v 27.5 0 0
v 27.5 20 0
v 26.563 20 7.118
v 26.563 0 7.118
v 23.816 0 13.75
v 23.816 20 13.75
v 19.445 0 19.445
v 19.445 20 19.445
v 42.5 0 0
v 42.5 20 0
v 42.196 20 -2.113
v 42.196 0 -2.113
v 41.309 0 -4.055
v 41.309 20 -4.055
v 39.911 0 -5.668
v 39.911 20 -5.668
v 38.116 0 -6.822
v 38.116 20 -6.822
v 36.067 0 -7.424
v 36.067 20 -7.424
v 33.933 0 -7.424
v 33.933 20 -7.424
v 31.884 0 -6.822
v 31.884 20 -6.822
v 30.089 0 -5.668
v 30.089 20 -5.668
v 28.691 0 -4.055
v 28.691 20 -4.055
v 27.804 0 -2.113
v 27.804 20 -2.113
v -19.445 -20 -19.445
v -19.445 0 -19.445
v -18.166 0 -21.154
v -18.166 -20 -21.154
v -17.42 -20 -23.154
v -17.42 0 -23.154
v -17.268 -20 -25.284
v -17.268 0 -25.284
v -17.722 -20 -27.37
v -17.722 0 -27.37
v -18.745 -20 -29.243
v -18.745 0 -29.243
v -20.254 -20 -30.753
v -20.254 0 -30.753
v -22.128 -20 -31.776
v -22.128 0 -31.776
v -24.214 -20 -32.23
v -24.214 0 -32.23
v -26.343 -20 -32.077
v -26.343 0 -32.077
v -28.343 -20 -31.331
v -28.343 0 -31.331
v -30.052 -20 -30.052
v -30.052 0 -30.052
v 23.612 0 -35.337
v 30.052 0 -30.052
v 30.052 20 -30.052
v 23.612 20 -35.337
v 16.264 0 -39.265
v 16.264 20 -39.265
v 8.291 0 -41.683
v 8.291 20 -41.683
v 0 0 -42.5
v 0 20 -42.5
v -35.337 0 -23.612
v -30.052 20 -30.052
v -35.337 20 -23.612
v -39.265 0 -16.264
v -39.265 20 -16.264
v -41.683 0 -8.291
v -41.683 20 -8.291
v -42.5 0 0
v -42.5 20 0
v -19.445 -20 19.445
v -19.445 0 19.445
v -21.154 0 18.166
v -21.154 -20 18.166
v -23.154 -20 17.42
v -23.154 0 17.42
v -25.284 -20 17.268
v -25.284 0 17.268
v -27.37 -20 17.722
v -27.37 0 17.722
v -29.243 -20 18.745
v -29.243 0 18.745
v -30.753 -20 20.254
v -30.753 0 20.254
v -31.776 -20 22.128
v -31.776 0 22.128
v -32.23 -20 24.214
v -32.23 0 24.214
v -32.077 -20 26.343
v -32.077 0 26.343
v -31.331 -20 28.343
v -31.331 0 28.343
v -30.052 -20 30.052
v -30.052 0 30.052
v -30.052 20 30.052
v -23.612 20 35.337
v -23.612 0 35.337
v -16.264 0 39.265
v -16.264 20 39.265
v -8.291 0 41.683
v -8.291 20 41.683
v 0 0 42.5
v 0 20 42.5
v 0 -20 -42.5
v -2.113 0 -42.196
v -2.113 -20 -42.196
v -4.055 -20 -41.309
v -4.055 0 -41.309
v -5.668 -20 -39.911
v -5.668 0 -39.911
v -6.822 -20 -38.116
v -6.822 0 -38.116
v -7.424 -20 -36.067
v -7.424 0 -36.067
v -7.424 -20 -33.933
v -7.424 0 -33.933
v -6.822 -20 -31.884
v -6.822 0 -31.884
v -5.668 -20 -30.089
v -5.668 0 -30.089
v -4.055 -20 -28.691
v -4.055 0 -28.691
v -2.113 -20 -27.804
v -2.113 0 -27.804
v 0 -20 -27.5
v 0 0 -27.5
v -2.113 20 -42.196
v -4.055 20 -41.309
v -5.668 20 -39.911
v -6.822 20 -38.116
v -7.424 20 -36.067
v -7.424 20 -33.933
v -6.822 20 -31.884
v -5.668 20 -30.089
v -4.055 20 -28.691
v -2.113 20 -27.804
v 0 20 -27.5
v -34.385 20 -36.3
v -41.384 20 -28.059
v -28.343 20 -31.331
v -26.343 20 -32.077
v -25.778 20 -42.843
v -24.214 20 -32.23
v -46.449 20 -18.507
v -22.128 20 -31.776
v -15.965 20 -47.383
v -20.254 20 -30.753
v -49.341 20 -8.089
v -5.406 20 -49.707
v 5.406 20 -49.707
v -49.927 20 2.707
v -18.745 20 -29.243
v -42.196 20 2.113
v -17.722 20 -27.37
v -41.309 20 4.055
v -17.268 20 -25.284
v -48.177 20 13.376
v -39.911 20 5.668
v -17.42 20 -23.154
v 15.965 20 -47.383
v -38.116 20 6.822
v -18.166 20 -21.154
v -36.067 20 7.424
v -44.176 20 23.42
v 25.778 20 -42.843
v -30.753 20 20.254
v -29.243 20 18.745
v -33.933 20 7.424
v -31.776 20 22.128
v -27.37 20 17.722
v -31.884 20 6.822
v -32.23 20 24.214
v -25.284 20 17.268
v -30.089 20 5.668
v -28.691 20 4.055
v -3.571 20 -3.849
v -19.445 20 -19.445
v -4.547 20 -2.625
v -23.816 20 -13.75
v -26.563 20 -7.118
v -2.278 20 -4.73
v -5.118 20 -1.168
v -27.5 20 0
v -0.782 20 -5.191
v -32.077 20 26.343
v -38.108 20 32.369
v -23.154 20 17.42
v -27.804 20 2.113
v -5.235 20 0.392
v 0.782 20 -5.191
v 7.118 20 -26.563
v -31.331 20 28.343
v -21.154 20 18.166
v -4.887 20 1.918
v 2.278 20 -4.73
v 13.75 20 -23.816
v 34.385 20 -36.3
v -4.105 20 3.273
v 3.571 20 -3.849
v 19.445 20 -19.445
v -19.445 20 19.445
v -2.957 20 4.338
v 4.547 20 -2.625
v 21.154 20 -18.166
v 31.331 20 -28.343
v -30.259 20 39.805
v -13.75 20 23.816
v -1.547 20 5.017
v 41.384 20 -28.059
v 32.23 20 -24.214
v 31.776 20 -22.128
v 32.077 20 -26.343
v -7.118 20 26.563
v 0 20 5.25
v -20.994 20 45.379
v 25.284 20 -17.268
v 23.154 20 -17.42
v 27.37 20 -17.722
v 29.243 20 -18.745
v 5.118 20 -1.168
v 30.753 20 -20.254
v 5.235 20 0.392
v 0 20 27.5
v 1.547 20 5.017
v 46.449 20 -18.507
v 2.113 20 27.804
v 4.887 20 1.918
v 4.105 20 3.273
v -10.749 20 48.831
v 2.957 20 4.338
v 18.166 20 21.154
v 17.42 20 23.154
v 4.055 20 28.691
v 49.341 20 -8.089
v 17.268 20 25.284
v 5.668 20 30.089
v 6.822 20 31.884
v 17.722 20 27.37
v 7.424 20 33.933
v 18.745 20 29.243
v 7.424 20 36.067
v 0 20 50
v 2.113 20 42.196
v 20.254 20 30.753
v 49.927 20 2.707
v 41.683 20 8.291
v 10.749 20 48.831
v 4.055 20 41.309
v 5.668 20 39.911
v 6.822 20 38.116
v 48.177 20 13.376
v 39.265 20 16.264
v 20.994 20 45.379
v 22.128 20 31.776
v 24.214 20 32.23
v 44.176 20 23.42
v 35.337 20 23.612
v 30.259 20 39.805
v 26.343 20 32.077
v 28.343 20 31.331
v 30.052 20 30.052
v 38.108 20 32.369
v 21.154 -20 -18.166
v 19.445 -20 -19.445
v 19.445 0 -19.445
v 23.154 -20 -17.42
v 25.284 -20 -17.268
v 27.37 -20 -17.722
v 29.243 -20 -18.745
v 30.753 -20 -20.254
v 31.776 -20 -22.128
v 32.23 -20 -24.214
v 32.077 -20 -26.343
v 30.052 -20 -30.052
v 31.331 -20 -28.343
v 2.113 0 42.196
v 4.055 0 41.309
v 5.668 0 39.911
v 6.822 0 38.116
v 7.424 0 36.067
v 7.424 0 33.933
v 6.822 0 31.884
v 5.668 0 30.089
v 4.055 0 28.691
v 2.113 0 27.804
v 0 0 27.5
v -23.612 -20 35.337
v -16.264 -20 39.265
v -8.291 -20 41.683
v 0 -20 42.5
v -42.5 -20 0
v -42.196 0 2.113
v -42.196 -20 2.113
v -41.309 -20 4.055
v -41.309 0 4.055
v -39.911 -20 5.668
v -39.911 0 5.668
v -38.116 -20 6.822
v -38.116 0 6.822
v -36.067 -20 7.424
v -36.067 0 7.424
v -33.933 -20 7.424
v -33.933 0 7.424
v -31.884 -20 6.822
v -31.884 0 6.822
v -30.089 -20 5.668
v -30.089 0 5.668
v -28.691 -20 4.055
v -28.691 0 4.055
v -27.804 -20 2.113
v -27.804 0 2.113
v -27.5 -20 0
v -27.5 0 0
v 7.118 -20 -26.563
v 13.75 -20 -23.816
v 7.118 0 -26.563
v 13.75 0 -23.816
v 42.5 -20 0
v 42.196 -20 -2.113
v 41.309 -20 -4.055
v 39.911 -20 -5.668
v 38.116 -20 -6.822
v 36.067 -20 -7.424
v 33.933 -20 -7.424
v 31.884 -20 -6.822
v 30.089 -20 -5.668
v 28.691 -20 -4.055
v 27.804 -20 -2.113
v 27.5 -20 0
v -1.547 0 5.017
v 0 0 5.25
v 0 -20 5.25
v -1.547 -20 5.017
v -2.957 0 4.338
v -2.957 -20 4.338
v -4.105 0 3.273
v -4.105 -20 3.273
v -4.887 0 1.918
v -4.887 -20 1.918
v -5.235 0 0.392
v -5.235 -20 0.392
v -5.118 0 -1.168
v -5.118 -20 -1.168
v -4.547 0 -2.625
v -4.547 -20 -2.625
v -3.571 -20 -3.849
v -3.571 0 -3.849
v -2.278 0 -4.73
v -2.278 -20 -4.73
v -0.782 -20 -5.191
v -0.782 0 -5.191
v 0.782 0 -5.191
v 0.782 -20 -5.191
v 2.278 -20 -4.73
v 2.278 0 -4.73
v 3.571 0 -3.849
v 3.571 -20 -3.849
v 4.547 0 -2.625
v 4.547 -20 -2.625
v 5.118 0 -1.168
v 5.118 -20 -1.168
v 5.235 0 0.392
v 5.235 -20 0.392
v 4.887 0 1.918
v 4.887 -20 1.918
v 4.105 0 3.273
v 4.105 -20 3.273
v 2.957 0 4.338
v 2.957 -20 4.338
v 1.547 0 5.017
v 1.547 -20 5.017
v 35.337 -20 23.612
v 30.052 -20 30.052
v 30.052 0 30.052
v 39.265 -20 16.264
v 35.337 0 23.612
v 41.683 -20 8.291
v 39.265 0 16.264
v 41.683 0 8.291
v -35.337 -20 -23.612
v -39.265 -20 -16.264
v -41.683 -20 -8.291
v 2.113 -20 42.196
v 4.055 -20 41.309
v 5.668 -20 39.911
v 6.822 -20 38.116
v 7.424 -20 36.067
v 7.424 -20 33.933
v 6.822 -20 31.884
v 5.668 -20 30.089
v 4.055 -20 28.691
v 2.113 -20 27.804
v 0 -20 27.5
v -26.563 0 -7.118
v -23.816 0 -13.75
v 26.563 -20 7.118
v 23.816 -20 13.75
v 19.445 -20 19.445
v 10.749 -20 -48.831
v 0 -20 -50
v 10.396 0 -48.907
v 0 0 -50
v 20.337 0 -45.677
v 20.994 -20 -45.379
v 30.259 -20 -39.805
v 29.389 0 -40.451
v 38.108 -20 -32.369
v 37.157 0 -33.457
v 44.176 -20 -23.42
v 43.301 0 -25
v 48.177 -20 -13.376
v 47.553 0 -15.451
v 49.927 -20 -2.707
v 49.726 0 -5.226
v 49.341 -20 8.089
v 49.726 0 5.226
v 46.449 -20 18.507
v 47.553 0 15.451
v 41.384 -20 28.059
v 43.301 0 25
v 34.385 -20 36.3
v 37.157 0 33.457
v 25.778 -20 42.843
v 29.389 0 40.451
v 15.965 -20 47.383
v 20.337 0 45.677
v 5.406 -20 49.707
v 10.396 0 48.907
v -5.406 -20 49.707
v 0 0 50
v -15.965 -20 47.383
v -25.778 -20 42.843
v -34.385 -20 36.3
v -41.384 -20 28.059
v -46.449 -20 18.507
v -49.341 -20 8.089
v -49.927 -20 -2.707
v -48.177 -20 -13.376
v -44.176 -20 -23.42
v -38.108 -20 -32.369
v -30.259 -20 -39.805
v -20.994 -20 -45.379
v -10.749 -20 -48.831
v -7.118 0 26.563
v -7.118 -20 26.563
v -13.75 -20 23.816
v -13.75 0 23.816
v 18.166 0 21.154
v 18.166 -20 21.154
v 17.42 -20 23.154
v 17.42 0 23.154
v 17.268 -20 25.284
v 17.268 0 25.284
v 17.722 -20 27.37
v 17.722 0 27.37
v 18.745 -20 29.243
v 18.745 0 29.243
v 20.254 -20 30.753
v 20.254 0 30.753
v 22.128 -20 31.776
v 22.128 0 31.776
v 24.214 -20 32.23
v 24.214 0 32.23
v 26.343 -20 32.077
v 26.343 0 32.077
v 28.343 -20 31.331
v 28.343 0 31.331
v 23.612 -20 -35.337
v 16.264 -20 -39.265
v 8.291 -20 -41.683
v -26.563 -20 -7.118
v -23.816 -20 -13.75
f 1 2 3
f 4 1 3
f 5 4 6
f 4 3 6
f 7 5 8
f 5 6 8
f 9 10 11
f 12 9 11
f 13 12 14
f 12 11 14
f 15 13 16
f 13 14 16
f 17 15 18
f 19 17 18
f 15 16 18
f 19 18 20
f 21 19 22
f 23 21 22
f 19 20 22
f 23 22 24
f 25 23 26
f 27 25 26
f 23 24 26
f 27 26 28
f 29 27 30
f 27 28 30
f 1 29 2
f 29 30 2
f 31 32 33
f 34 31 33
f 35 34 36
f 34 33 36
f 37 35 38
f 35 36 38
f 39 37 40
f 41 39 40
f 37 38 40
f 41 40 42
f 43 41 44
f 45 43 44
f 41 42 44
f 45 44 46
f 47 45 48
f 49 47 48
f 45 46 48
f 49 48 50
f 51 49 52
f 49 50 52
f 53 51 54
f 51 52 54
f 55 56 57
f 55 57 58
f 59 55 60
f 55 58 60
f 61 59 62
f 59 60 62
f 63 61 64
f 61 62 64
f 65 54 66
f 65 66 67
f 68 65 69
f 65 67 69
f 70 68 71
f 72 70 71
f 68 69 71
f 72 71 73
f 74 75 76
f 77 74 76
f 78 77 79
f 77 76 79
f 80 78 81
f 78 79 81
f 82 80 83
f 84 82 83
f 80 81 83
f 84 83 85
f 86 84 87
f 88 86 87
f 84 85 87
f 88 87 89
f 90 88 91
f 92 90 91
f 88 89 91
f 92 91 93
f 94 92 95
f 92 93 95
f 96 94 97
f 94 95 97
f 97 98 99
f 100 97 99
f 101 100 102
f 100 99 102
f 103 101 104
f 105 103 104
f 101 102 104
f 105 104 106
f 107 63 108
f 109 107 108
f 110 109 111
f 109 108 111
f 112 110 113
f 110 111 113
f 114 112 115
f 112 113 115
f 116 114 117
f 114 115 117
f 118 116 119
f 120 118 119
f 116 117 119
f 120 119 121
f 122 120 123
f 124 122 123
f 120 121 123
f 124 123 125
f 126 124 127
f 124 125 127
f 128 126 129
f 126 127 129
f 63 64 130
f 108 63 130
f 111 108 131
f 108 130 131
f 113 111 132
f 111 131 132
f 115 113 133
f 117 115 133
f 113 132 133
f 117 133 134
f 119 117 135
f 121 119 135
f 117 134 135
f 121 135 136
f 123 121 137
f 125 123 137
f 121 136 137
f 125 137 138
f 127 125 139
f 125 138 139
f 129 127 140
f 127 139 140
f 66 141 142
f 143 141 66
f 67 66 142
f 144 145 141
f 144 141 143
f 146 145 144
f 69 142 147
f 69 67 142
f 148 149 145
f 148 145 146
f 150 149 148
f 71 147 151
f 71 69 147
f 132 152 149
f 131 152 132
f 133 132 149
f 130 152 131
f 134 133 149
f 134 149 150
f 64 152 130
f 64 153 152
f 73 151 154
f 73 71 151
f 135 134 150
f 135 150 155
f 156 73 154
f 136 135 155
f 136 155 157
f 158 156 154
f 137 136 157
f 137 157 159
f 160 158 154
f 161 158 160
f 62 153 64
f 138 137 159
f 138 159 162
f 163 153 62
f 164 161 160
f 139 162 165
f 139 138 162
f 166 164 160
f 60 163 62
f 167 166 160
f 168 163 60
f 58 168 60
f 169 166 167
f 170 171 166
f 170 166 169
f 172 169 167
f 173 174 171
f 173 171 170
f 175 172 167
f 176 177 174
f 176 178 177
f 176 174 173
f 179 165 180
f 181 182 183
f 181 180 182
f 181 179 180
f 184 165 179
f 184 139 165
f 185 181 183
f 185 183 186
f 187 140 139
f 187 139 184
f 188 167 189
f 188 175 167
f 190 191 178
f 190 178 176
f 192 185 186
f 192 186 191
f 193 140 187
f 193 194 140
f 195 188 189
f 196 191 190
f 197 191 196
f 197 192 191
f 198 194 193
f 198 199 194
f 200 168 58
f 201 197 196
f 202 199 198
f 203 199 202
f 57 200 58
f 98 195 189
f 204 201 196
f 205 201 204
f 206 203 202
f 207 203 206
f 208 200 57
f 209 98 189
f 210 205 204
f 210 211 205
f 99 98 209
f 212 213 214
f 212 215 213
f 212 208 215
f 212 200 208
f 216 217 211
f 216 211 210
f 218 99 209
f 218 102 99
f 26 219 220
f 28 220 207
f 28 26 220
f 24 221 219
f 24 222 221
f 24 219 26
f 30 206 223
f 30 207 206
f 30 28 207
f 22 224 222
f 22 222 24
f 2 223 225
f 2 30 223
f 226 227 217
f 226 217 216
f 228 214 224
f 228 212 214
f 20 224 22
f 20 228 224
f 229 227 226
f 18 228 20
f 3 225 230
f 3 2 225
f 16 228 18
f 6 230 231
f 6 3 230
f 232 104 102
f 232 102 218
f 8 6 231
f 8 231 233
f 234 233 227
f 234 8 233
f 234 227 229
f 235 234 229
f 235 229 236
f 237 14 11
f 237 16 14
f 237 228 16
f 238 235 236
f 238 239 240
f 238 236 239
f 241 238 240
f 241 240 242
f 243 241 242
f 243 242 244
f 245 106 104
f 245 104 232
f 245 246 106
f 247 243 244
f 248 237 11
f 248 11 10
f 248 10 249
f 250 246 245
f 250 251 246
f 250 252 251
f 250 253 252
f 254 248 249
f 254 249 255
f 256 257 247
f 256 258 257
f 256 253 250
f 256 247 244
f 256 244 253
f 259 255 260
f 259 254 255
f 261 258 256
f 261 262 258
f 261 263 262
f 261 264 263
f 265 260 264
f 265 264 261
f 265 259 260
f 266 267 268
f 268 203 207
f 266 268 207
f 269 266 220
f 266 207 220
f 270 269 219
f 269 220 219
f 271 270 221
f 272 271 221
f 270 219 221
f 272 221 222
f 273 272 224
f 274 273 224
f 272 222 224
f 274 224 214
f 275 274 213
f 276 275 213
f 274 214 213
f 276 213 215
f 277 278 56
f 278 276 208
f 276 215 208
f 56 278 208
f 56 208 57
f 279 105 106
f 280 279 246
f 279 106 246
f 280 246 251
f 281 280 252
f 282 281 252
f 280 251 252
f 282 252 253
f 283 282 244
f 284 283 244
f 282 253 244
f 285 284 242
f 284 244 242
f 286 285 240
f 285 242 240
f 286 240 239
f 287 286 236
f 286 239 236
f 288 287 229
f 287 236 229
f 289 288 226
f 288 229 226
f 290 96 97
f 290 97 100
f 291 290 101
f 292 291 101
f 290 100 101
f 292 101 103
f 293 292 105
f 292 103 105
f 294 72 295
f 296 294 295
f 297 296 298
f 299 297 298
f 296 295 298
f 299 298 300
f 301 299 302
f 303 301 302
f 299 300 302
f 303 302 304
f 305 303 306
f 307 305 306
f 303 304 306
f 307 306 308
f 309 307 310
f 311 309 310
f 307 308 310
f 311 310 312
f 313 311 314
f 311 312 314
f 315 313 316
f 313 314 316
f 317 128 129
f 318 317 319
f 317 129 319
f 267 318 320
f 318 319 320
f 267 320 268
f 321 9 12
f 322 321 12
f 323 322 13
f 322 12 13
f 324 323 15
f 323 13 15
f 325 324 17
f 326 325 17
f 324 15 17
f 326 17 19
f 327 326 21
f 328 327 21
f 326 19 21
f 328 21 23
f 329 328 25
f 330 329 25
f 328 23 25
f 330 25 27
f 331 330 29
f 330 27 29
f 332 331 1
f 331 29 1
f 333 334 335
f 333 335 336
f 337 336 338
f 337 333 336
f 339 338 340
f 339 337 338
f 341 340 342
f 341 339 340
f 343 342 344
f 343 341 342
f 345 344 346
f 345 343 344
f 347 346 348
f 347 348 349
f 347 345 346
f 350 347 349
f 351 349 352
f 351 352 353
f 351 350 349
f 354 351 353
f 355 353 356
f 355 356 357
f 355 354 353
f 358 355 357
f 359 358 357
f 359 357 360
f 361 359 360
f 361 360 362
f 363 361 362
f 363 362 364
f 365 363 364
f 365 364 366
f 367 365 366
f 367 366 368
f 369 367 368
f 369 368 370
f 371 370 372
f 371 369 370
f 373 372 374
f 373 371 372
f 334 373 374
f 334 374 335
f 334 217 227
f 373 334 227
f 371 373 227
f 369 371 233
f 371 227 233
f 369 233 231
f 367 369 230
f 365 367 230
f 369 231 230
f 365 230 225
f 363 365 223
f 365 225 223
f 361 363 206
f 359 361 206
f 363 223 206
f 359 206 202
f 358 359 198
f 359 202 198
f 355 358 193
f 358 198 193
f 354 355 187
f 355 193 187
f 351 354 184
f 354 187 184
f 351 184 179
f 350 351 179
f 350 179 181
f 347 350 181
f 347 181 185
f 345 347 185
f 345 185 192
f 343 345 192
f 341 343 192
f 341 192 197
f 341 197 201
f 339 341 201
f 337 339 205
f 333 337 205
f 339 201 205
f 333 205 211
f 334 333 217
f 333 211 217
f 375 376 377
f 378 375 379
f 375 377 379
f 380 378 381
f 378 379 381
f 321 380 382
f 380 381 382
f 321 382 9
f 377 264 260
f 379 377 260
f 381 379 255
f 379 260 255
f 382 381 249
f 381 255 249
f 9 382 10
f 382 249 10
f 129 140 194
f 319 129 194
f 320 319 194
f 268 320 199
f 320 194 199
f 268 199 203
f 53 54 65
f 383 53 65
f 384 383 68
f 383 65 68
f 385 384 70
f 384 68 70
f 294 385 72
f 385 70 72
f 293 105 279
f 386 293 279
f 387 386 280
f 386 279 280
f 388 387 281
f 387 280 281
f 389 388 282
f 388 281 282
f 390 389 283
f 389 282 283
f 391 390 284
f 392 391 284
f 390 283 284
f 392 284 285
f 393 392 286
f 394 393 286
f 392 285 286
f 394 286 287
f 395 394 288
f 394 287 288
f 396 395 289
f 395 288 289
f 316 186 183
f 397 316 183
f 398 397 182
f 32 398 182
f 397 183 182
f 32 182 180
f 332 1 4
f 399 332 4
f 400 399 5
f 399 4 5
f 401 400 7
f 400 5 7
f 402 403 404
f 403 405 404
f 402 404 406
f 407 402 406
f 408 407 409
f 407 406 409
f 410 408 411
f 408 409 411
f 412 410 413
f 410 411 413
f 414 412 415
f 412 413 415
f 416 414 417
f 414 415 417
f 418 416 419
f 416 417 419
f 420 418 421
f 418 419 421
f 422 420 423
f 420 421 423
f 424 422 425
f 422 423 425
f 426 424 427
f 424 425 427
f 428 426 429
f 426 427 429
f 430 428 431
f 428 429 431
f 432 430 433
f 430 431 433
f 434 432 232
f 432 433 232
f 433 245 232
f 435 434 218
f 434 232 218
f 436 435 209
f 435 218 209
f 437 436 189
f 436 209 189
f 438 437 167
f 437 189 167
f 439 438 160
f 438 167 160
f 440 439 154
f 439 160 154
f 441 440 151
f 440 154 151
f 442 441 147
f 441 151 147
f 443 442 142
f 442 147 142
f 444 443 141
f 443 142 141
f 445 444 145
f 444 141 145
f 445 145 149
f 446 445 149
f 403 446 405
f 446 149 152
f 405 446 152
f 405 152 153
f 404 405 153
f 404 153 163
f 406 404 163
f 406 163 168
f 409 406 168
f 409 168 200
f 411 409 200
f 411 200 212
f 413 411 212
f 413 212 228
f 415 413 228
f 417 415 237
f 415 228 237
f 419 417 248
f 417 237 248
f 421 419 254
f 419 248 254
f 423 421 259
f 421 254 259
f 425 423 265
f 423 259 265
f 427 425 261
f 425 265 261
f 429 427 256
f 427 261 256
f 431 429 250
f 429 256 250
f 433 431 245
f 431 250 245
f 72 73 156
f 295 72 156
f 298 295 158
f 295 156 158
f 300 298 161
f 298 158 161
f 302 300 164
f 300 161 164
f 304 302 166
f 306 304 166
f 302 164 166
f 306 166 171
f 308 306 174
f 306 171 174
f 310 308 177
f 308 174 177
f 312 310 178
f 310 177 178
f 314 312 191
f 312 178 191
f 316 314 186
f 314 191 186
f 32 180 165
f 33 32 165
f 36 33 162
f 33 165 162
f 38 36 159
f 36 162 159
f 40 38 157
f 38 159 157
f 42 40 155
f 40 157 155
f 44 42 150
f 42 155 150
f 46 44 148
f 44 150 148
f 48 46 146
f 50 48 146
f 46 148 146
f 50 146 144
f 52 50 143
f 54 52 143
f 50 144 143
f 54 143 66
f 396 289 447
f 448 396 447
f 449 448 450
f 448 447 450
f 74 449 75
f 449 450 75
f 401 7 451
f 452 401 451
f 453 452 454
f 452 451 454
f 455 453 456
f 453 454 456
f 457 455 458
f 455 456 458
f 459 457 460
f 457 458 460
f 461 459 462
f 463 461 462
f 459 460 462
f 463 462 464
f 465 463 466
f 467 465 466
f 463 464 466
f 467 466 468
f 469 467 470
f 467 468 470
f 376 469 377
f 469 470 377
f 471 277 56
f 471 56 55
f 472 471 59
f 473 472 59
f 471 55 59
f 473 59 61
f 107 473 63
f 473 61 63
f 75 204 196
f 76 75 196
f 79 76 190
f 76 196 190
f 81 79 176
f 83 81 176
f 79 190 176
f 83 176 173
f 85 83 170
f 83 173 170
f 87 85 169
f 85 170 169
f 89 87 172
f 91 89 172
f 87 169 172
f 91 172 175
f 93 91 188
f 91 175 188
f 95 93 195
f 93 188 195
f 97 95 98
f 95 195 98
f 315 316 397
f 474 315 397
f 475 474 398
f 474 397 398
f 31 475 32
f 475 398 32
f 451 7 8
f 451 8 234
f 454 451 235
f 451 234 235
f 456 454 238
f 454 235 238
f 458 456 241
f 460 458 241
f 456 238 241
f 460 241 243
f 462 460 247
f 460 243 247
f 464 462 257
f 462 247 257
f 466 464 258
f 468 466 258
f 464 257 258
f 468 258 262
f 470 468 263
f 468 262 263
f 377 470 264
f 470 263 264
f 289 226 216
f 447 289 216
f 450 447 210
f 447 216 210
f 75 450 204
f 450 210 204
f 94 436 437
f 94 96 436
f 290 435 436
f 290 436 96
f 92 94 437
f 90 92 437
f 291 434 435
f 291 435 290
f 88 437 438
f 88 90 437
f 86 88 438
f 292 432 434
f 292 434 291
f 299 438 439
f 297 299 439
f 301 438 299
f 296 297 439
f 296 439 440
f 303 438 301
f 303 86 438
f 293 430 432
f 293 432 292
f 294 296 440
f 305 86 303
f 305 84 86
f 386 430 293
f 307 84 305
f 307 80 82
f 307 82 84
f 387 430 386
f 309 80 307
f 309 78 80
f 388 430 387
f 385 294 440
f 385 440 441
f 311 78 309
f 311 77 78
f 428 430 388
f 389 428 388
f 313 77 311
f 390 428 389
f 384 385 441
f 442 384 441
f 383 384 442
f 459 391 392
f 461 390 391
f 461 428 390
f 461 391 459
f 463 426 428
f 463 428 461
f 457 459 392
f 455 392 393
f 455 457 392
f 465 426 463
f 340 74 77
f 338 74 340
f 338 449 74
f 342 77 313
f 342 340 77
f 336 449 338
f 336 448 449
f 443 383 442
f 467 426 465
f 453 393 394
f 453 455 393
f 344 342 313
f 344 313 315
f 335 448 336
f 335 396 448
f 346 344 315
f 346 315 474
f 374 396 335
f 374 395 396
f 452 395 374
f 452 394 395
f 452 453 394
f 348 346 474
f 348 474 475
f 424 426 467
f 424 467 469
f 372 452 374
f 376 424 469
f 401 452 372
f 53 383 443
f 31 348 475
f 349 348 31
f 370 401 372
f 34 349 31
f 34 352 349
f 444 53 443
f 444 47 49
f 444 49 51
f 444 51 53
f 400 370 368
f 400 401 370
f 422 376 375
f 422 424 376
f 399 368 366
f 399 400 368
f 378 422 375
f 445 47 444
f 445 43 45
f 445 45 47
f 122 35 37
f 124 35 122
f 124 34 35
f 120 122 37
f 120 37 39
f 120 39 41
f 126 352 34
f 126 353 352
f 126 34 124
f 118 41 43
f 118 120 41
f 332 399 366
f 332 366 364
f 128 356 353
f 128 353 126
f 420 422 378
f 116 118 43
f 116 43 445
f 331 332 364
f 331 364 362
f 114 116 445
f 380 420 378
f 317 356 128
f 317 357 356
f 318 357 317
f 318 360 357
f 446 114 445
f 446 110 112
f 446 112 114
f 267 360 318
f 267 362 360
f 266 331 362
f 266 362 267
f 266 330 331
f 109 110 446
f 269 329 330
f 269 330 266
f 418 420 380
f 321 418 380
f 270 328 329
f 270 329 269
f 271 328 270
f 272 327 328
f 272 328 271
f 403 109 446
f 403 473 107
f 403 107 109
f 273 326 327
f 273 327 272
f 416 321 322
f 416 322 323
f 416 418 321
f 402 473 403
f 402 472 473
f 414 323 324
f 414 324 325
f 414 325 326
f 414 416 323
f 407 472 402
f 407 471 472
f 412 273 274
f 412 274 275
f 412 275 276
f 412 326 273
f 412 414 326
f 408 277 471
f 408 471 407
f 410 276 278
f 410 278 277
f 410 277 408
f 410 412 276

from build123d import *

# Parameters (mm, degrees)
SKETCH_1_R          = 50
EXTRUDE_1_DEPTH     = 20
SKETCH_2_R          = 5.25
CUT_EXTRUDE_1_DEPTH = 20
CUT_EXTRUDE_2_DEPTH = 20
SKETCH_4_R          = 50
SKETCH_4_R_2        = 5.25
EXTRUDE_2_DEPTH     = 20


with BuildPart() as part:
    # 草图1 → 凸台-拉伸1 (new body)
    with BuildSketch(Plane(origin=(0, 0, 0), x_dir=(1, 0, 0), z_dir=(0, 1, 0))):
        with Locations(Location((0, 0, 0), (0, 0, 270))):
            Circle(SKETCH_1_R)
    extrude(amount=EXTRUDE_1_DEPTH)

    # 草图2 → 切除-拉伸1 (cut)
    with BuildSketch(Plane(origin=(0, 20, 0), x_dir=(1, 0, 0), z_dir=(0, 1, 0))):
        with Locations(Location((0, 0, 0), (0, 0, 270))):
            Circle(SKETCH_2_R)
    extrude(amount=-CUT_EXTRUDE_1_DEPTH, mode=Mode.SUBTRACT)

    # 草图3 → 切除-拉伸2 (cut)
    with BuildSketch(Plane(origin=(0, 20, 0), x_dir=(1, 0, 0), z_dir=(0, 1, 0))):
        with BuildLine():
            ThreePointArc((42.5, 0), (35, 7.5), (27.5, 0))
            ThreePointArc((27.5, 0), (25.406687144, -10.52379439), (19.445436483, -19.445436483))
            ThreePointArc((19.445436483, -19.445436483), (19.445436477, -30.052038195), (30.052038189, -30.052038212))
            ThreePointArc((30.052038189, -30.052038212), (39.264880129, -16.264045883), (42.5, 0))
        make_face()
        with BuildLine():
            ThreePointArc((2e-09, 27.5), (10.523794391, 25.406687144), (19.445436483, 19.445436483))
            ThreePointArc((19.445436483, 19.445436483), (30.0520382, 19.445436483), (30.0520382, 30.0520382))
            ThreePointArc((30.0520382, 30.0520382), (16.264045902, 39.264880121), (5.8e-08, 42.5))
            ThreePointArc((5.8e-08, 42.5), (-7.5, 35.000000028), (2e-09, 27.5))
        make_face()
        with BuildLine():
            ThreePointArc((-30.0520382, -30.0520382), (-16.264045799, -39.264880163), (1.65e-07, -42.5))
            ThreePointArc((1.65e-07, -42.5), (7.5, -34.999999948), (6.1e-08, -27.5))
            ThreePointArc((6.1e-08, -27.5), (-10.523794348, -25.406687162), (-19.44543646, -19.445436505))
            ThreePointArc((-19.44543646, -19.445436505), (-30.052038189, -19.445436472), (-30.0520382, -30.0520382))
        make_face()
        with BuildLine():
            ThreePointArc((-27.5, 0), (-25.406687154, 10.523794365), (-19.445436521, 19.445436445))
            ThreePointArc((-19.445436521, 19.445436445), (-19.445436492, 30.05203821), (-30.052038258, 30.052038143))
            ThreePointArc((-30.052038258, 30.052038143), (-39.264880164, 16.264045797), (-42.5, -8.9e-08))
            ThreePointArc((-42.5, -8.9e-08), (-34.999999956, -7.5), (-27.5, 0))
        make_face()
    extrude(amount=-CUT_EXTRUDE_2_DEPTH, mode=Mode.SUBTRACT)

    # 草图4 → 凸台-拉伸2 (add)
    # profile 1 of 6: a face of its own
    with BuildSketch(Plane.XZ):
        with Locations(Location((0, 0, 0), (0, 0, 270))):
            Circle(SKETCH_4_R)
        with BuildLine():
            ThreePointArc((30.0520382, 30.0520382), (39.264880132, 16.264045876), (42.5, 0))
            ThreePointArc((42.5, 0), (39.264880132, -16.264045876), (30.0520382, -30.0520382))
            ThreePointArc((30.0520382, -30.0520382), (16.264045876, -39.264880132), (0, -42.5))
            ThreePointArc((0, -42.5), (-16.264045876, -39.264880132), (-30.0520382, -30.0520382))
            ThreePointArc((-30.0520382, -30.0520382), (-39.264880132, -16.264045876), (-42.5, 0))
            ThreePointArc((-42.5, 0), (-39.264880132, 16.264045876), (-30.0520382, 30.0520382))
            ThreePointArc((-30.0520382, 30.0520382), (-16.264045876, 39.264880132), (0, 42.5))
            ThreePointArc((0, 42.5), (16.264045876, 39.264880132), (30.0520382, 30.0520382))
        make_face(mode=Mode.SUBTRACT)
    # profile 2 of 6: a face of its own
    with BuildSketch(Plane.XZ):
        with BuildLine():
            ThreePointArc((0, -42.5), (-7.5, -35), (0, -27.5))
            ThreePointArc((0, -27.5), (-10.52379439, -25.406687144), (-19.445436483, -19.445436483))
            ThreePointArc((-19.445436483, -19.445436483), (-19.445436483, -30.0520382), (-30.0520382, -30.0520382))
            ThreePointArc((-30.0520382, -30.0520382), (-16.264045876, -39.264880132), (0, -42.5))
        make_face()
    # profile 3 of 6: a face of its own
    with BuildSketch(Plane.XZ):
        with BuildLine():
            ThreePointArc((-27.5, 0), (-25.406687144, 10.52379439), (-19.445436483, 19.445436483))
            ThreePointArc((-19.445436483, 19.445436483), (-30.0520382, 19.445436483), (-30.0520382, 30.0520382))
            ThreePointArc((-30.0520382, 30.0520382), (-39.264880132, 16.264045876), (-42.5, 0))
            ThreePointArc((-42.5, 0), (-35, 7.5), (-27.5, 0))
        make_face()
    # profile 4 of 6: a face of its own
    with BuildSketch(Plane.XZ):
        with BuildLine():
            ThreePointArc((0, 27.5), (10.52379439, 25.406687144), (19.445436483, 19.445436483))
            ThreePointArc((19.445436483, 19.445436483), (19.445436483, 30.0520382), (30.0520382, 30.0520382))
            ThreePointArc((30.0520382, 30.0520382), (16.264045876, 39.264880132), (0, 42.5))
            ThreePointArc((0, 42.5), (7.5, 35), (0, 27.5))
        make_face()
    # profile 5 of 6: a face of its own
    with BuildSketch(Plane.XZ):
        with BuildLine():
            ThreePointArc((19.445436483, -19.445436483), (25.406687144, -10.52379439), (27.5, 0))
            ThreePointArc((27.5, 0), (25.406687144, 10.52379439), (19.445436483, 19.445436483))
            ThreePointArc((19.445436483, 19.445436483), (10.52379439, 25.406687144), (0, 27.5))
            ThreePointArc((0, 27.5), (-10.52379439, 25.406687144), (-19.445436483, 19.445436483))
            ThreePointArc((-19.445436483, 19.445436483), (-25.406687144, 10.52379439), (-27.5, 0))
            ThreePointArc((-27.5, 0), (-25.406687144, -10.52379439), (-19.445436483, -19.445436483))
            ThreePointArc((-19.445436483, -19.445436483), (-10.52379439, -25.406687144), (0, -27.5))
            ThreePointArc((0, -27.5), (10.52379439, -25.406687144), (19.445436483, -19.445436483))
        make_face()
        with Locations(Location((0, 0, 0), (0, 0, 90))):
            Circle(SKETCH_4_R_2, mode=Mode.SUBTRACT)
    # profile 6 of 6: a face of its own
    with BuildSketch(Plane.XZ):
        with BuildLine():
            ThreePointArc((42.5, 0), (35, -7.5), (27.5, 0))
            ThreePointArc((27.5, 0), (25.406687144, -10.52379439), (19.445436483, -19.445436483))
            ThreePointArc((19.445436483, -19.445436483), (30.0520382, -19.445436483), (30.0520382, -30.0520382))
            ThreePointArc((30.0520382, -30.0520382), (39.264880132, -16.264045876), (42.5, 0))
        make_face()
    extrude(amount=EXTRUDE_2_DEPTH)


solid = part.part
